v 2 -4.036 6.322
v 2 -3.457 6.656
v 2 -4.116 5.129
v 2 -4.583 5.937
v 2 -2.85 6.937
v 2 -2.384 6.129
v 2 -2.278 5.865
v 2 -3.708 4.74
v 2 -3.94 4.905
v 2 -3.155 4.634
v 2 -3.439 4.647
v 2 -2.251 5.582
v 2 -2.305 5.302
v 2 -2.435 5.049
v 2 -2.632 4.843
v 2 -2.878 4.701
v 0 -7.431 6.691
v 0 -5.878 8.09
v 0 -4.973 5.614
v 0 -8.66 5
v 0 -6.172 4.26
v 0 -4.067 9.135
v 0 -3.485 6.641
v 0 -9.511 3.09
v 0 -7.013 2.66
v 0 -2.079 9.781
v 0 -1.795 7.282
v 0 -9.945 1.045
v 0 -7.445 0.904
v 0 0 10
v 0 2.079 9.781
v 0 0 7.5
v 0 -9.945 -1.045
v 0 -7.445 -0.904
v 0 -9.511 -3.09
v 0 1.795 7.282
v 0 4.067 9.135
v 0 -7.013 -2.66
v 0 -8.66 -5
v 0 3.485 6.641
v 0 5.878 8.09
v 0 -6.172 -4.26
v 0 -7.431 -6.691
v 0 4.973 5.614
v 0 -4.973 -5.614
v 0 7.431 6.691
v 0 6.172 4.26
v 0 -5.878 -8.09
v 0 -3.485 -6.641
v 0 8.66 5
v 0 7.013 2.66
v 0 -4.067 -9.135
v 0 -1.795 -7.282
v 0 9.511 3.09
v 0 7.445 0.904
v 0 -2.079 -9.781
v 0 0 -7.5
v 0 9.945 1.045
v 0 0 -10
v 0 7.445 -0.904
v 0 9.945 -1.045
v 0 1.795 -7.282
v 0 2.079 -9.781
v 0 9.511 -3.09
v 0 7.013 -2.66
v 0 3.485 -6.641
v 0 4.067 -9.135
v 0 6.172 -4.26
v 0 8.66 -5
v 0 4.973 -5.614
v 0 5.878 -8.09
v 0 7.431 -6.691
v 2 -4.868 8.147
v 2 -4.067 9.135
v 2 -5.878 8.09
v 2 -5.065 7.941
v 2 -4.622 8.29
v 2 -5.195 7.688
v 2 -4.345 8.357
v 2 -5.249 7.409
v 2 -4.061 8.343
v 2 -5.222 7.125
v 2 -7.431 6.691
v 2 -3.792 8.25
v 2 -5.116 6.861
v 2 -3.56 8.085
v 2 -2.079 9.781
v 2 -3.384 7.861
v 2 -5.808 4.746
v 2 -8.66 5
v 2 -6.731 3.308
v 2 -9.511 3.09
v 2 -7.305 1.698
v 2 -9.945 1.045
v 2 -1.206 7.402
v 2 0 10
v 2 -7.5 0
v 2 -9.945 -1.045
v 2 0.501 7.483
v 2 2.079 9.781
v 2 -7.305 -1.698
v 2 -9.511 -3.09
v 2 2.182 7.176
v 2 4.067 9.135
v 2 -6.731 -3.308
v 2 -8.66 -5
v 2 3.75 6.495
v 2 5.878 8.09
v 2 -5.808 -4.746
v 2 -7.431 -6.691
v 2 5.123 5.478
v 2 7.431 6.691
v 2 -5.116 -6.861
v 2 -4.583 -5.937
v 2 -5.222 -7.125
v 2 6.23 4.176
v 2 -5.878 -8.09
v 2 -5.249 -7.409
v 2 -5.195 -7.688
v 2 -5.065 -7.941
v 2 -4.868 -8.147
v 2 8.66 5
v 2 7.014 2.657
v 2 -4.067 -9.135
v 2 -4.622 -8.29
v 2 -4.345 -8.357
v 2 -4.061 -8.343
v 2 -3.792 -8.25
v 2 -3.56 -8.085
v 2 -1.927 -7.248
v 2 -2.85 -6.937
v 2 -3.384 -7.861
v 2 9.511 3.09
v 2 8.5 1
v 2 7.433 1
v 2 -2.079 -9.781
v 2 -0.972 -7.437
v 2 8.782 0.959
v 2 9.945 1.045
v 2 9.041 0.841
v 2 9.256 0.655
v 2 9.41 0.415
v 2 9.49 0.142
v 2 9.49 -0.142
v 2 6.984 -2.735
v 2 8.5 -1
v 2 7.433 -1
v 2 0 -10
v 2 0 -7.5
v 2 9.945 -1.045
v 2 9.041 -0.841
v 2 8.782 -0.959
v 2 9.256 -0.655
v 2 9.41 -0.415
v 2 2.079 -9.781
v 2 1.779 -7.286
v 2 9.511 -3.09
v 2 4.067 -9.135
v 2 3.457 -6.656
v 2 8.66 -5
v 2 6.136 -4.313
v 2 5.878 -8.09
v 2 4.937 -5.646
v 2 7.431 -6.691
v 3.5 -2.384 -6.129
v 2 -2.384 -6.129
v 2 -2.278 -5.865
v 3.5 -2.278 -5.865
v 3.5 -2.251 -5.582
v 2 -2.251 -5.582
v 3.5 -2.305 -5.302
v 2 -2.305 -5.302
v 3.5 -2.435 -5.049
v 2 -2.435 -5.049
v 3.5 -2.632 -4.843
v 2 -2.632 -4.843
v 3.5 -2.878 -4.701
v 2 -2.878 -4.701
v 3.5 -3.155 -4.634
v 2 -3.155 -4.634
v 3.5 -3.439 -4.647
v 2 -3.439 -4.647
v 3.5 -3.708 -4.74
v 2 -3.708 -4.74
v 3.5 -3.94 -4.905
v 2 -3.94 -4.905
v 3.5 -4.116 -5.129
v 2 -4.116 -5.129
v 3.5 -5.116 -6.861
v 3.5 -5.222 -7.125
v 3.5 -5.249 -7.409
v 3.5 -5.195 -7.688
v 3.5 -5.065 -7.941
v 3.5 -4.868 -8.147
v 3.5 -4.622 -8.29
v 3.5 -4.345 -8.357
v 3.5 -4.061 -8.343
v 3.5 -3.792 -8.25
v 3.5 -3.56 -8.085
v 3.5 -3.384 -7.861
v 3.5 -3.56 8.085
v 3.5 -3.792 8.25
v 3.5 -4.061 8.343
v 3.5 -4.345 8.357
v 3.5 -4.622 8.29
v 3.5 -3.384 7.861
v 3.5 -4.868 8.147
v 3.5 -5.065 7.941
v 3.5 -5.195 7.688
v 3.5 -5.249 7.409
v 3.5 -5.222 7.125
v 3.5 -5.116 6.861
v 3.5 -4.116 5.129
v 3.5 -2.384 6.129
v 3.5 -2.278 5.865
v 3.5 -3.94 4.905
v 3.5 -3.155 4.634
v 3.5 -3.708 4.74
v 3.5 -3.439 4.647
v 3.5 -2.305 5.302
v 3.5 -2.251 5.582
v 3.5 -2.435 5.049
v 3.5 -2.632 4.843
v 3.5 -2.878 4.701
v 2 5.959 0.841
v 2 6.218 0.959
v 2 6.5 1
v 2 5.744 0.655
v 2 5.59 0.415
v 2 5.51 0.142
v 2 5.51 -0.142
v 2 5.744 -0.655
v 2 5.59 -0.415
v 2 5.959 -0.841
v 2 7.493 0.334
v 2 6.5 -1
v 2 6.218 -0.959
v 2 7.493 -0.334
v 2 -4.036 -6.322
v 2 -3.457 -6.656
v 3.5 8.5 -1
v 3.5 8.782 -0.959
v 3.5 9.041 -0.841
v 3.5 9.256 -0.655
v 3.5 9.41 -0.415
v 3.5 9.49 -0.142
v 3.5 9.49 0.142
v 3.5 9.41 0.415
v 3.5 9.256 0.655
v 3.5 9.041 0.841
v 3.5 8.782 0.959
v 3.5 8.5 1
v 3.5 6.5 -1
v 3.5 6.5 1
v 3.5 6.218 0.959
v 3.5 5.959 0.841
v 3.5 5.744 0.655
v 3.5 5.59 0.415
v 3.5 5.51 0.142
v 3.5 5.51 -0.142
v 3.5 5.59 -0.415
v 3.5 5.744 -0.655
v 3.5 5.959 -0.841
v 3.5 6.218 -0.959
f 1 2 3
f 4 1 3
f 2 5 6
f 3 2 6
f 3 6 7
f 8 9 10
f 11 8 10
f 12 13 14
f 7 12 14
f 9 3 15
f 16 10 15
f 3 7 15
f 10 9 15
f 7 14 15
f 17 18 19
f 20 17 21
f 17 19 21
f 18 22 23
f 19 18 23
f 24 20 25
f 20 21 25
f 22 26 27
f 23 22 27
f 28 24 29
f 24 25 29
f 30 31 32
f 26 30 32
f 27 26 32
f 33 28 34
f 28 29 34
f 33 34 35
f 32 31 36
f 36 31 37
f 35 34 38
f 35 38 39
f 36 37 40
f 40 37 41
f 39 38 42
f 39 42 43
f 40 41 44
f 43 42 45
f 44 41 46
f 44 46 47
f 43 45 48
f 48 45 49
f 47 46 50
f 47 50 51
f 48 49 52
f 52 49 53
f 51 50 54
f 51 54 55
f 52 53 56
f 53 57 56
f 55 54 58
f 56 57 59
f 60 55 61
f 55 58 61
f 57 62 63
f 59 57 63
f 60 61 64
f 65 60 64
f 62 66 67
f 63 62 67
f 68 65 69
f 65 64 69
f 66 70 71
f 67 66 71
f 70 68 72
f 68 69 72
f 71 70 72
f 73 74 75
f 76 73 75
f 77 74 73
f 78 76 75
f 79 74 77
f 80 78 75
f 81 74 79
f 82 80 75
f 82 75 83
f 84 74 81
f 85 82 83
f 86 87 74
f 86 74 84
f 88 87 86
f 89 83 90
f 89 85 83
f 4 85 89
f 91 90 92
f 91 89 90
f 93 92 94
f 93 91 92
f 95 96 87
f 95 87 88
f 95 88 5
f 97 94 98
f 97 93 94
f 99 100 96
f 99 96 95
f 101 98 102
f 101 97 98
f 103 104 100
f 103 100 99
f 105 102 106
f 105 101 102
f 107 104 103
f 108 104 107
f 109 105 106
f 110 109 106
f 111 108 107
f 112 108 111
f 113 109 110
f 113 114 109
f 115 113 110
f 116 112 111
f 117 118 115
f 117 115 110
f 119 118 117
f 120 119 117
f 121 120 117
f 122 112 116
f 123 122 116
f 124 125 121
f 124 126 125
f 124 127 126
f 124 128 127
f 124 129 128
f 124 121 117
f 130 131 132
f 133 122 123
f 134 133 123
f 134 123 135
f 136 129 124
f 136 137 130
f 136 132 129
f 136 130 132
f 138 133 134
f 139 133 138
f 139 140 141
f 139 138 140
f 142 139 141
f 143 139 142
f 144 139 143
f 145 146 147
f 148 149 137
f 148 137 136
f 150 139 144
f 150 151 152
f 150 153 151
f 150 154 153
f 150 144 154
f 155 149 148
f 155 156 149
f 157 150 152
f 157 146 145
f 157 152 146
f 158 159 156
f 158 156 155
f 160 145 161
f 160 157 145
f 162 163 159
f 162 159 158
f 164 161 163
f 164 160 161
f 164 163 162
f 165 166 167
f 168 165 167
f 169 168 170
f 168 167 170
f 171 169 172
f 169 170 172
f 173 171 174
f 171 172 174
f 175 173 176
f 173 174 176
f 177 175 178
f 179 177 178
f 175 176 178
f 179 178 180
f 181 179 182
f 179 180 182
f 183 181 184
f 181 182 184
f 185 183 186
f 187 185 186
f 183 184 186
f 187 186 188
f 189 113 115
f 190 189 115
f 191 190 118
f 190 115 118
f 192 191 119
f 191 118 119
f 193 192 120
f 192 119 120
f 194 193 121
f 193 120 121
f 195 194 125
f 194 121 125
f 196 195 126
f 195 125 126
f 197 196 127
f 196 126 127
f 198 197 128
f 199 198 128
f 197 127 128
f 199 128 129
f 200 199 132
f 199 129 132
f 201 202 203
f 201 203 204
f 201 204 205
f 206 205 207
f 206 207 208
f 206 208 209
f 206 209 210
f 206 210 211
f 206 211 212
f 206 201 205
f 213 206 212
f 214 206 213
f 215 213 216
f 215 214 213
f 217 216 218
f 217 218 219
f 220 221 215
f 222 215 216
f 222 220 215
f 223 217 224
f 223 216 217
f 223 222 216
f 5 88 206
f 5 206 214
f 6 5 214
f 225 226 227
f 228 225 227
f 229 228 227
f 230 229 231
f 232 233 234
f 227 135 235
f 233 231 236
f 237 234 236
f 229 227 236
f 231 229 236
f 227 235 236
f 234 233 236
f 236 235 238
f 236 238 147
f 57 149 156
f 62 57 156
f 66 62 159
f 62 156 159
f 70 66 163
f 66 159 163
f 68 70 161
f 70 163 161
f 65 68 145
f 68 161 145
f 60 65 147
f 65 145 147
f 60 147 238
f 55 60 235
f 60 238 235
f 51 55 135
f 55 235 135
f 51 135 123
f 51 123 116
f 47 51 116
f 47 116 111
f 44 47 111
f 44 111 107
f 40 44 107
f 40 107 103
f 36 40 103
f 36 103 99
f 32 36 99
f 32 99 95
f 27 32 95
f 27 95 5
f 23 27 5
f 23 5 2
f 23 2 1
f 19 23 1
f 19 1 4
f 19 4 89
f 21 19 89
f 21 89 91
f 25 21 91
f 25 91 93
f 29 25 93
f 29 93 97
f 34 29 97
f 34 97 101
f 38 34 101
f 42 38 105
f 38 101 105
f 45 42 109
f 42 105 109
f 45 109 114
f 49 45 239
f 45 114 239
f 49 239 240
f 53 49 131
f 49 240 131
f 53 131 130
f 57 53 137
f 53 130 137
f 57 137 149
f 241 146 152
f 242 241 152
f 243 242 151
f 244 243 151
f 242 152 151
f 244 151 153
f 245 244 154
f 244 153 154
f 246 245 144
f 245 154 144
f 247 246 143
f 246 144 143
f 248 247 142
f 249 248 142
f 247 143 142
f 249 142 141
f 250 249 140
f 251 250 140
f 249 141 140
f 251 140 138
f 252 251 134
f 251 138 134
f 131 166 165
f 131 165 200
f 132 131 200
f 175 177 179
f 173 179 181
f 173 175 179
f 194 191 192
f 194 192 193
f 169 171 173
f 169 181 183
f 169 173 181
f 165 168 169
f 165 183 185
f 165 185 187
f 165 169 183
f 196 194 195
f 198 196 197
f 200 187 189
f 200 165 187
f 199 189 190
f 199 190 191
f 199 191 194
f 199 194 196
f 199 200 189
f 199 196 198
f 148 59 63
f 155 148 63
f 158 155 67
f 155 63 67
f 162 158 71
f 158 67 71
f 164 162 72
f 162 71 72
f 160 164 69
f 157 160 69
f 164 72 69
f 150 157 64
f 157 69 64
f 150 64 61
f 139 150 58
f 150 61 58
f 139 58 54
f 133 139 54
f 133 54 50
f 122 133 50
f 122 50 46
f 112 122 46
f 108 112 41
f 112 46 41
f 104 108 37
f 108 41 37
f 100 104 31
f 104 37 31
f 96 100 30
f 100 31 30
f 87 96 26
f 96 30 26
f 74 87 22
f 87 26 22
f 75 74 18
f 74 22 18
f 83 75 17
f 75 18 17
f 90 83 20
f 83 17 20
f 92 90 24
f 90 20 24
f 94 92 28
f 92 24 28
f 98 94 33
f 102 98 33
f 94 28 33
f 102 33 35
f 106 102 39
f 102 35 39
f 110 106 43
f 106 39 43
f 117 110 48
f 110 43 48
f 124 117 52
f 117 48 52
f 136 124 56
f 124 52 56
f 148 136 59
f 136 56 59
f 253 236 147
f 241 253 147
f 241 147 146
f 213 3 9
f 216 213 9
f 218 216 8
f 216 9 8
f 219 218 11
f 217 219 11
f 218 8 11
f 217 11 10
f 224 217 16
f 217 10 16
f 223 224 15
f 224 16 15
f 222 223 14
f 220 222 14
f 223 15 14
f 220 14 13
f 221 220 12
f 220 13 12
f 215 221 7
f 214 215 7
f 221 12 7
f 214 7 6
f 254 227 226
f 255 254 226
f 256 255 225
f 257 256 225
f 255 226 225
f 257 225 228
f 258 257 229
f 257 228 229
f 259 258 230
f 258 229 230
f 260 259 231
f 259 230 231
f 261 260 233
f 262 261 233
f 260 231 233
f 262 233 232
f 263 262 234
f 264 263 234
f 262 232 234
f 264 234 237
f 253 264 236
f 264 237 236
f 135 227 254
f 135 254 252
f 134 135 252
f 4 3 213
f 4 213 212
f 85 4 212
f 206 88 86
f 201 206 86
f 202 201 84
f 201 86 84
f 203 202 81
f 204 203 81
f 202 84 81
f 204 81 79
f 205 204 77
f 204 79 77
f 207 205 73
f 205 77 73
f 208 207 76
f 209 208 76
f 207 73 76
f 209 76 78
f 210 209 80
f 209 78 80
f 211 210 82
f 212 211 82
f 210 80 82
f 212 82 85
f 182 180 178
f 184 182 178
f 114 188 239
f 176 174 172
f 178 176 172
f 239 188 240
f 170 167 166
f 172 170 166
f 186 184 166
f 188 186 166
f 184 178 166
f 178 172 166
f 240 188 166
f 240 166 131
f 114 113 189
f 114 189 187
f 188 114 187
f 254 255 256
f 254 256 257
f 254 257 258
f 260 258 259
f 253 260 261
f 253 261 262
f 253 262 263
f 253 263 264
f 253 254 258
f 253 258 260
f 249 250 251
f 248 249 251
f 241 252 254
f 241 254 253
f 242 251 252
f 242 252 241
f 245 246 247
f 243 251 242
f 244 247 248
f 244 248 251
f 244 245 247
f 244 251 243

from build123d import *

# Parameters (mm, degrees)
SKETCH_1_R          = 10
EXTRUDE_1_DEPTH     = 2
SKETCH_3_R          = 7.5
CUT_EXTRUDE_1_DEPTH = 12.5
SKETCH_5_R          = 1
SKETCH_5_W          = 2
SKETCH_5_H          = 2
EXTRUDE_5_DEPTH     = 1.5


with BuildPart() as part:
    # 草图1 → 凸台-拉伸1 (new body)
    with BuildSketch(Plane(origin=(0, 0, 0), x_dir=(0, 0, -1), z_dir=(1, 0, 0))):
        Circle(SKETCH_1_R)
    extrude(amount=EXTRUDE_1_DEPTH)

    # 草图3 → 切除-拉伸1 (cut)
    with BuildSketch(Plane(origin=(2, 0, 0), x_dir=(0, 0, -1), z_dir=(1, 0, 0))):
        Circle(SKETCH_3_R)
    extrude(amount=-CUT_EXTRUDE_1_DEPTH, mode=Mode.SUBTRACT)

    # 草图5 → 凸台-拉伸5 (add)
    with BuildSketch(Plane(origin=(2, 0, 0), x_dir=(0, 0, -1), z_dir=(1, 0, 0))):
        with Locations((0, 8.5)):
            Circle(SKETCH_5_R)
        with Locations((7.361215932, -4.25)):
            Circle(SKETCH_5_R)
        with Locations((-7.361215932, -4.25)):
            Circle(SKETCH_5_R)
        with Locations((-5.629165125, -3.25)):
            Circle(SKETCH_5_R)
        with Locations((0, 6.5)):
            Circle(SKETCH_5_R)
        with Locations((5.629165125, -3.25)):
            Circle(SKETCH_5_R)
        Polygon((-7.861215932, -3.383974596), (-6.129165125, -2.383974596), (-5.129165125, -4.116025404), (-6.861215932, -5.116025404), align=None)
        with Locations((0, 7.5)):
            Rectangle(SKETCH_5_W, SKETCH_5_H)
        Polygon((6.129165125, -2.383974596), (7.861215932, -3.383974596), (6.861215932, -5.116025404), (5.129165125, -4.116025404), align=None)
    extrude(amount=EXTRUDE_5_DEPTH)


solid = part.part
